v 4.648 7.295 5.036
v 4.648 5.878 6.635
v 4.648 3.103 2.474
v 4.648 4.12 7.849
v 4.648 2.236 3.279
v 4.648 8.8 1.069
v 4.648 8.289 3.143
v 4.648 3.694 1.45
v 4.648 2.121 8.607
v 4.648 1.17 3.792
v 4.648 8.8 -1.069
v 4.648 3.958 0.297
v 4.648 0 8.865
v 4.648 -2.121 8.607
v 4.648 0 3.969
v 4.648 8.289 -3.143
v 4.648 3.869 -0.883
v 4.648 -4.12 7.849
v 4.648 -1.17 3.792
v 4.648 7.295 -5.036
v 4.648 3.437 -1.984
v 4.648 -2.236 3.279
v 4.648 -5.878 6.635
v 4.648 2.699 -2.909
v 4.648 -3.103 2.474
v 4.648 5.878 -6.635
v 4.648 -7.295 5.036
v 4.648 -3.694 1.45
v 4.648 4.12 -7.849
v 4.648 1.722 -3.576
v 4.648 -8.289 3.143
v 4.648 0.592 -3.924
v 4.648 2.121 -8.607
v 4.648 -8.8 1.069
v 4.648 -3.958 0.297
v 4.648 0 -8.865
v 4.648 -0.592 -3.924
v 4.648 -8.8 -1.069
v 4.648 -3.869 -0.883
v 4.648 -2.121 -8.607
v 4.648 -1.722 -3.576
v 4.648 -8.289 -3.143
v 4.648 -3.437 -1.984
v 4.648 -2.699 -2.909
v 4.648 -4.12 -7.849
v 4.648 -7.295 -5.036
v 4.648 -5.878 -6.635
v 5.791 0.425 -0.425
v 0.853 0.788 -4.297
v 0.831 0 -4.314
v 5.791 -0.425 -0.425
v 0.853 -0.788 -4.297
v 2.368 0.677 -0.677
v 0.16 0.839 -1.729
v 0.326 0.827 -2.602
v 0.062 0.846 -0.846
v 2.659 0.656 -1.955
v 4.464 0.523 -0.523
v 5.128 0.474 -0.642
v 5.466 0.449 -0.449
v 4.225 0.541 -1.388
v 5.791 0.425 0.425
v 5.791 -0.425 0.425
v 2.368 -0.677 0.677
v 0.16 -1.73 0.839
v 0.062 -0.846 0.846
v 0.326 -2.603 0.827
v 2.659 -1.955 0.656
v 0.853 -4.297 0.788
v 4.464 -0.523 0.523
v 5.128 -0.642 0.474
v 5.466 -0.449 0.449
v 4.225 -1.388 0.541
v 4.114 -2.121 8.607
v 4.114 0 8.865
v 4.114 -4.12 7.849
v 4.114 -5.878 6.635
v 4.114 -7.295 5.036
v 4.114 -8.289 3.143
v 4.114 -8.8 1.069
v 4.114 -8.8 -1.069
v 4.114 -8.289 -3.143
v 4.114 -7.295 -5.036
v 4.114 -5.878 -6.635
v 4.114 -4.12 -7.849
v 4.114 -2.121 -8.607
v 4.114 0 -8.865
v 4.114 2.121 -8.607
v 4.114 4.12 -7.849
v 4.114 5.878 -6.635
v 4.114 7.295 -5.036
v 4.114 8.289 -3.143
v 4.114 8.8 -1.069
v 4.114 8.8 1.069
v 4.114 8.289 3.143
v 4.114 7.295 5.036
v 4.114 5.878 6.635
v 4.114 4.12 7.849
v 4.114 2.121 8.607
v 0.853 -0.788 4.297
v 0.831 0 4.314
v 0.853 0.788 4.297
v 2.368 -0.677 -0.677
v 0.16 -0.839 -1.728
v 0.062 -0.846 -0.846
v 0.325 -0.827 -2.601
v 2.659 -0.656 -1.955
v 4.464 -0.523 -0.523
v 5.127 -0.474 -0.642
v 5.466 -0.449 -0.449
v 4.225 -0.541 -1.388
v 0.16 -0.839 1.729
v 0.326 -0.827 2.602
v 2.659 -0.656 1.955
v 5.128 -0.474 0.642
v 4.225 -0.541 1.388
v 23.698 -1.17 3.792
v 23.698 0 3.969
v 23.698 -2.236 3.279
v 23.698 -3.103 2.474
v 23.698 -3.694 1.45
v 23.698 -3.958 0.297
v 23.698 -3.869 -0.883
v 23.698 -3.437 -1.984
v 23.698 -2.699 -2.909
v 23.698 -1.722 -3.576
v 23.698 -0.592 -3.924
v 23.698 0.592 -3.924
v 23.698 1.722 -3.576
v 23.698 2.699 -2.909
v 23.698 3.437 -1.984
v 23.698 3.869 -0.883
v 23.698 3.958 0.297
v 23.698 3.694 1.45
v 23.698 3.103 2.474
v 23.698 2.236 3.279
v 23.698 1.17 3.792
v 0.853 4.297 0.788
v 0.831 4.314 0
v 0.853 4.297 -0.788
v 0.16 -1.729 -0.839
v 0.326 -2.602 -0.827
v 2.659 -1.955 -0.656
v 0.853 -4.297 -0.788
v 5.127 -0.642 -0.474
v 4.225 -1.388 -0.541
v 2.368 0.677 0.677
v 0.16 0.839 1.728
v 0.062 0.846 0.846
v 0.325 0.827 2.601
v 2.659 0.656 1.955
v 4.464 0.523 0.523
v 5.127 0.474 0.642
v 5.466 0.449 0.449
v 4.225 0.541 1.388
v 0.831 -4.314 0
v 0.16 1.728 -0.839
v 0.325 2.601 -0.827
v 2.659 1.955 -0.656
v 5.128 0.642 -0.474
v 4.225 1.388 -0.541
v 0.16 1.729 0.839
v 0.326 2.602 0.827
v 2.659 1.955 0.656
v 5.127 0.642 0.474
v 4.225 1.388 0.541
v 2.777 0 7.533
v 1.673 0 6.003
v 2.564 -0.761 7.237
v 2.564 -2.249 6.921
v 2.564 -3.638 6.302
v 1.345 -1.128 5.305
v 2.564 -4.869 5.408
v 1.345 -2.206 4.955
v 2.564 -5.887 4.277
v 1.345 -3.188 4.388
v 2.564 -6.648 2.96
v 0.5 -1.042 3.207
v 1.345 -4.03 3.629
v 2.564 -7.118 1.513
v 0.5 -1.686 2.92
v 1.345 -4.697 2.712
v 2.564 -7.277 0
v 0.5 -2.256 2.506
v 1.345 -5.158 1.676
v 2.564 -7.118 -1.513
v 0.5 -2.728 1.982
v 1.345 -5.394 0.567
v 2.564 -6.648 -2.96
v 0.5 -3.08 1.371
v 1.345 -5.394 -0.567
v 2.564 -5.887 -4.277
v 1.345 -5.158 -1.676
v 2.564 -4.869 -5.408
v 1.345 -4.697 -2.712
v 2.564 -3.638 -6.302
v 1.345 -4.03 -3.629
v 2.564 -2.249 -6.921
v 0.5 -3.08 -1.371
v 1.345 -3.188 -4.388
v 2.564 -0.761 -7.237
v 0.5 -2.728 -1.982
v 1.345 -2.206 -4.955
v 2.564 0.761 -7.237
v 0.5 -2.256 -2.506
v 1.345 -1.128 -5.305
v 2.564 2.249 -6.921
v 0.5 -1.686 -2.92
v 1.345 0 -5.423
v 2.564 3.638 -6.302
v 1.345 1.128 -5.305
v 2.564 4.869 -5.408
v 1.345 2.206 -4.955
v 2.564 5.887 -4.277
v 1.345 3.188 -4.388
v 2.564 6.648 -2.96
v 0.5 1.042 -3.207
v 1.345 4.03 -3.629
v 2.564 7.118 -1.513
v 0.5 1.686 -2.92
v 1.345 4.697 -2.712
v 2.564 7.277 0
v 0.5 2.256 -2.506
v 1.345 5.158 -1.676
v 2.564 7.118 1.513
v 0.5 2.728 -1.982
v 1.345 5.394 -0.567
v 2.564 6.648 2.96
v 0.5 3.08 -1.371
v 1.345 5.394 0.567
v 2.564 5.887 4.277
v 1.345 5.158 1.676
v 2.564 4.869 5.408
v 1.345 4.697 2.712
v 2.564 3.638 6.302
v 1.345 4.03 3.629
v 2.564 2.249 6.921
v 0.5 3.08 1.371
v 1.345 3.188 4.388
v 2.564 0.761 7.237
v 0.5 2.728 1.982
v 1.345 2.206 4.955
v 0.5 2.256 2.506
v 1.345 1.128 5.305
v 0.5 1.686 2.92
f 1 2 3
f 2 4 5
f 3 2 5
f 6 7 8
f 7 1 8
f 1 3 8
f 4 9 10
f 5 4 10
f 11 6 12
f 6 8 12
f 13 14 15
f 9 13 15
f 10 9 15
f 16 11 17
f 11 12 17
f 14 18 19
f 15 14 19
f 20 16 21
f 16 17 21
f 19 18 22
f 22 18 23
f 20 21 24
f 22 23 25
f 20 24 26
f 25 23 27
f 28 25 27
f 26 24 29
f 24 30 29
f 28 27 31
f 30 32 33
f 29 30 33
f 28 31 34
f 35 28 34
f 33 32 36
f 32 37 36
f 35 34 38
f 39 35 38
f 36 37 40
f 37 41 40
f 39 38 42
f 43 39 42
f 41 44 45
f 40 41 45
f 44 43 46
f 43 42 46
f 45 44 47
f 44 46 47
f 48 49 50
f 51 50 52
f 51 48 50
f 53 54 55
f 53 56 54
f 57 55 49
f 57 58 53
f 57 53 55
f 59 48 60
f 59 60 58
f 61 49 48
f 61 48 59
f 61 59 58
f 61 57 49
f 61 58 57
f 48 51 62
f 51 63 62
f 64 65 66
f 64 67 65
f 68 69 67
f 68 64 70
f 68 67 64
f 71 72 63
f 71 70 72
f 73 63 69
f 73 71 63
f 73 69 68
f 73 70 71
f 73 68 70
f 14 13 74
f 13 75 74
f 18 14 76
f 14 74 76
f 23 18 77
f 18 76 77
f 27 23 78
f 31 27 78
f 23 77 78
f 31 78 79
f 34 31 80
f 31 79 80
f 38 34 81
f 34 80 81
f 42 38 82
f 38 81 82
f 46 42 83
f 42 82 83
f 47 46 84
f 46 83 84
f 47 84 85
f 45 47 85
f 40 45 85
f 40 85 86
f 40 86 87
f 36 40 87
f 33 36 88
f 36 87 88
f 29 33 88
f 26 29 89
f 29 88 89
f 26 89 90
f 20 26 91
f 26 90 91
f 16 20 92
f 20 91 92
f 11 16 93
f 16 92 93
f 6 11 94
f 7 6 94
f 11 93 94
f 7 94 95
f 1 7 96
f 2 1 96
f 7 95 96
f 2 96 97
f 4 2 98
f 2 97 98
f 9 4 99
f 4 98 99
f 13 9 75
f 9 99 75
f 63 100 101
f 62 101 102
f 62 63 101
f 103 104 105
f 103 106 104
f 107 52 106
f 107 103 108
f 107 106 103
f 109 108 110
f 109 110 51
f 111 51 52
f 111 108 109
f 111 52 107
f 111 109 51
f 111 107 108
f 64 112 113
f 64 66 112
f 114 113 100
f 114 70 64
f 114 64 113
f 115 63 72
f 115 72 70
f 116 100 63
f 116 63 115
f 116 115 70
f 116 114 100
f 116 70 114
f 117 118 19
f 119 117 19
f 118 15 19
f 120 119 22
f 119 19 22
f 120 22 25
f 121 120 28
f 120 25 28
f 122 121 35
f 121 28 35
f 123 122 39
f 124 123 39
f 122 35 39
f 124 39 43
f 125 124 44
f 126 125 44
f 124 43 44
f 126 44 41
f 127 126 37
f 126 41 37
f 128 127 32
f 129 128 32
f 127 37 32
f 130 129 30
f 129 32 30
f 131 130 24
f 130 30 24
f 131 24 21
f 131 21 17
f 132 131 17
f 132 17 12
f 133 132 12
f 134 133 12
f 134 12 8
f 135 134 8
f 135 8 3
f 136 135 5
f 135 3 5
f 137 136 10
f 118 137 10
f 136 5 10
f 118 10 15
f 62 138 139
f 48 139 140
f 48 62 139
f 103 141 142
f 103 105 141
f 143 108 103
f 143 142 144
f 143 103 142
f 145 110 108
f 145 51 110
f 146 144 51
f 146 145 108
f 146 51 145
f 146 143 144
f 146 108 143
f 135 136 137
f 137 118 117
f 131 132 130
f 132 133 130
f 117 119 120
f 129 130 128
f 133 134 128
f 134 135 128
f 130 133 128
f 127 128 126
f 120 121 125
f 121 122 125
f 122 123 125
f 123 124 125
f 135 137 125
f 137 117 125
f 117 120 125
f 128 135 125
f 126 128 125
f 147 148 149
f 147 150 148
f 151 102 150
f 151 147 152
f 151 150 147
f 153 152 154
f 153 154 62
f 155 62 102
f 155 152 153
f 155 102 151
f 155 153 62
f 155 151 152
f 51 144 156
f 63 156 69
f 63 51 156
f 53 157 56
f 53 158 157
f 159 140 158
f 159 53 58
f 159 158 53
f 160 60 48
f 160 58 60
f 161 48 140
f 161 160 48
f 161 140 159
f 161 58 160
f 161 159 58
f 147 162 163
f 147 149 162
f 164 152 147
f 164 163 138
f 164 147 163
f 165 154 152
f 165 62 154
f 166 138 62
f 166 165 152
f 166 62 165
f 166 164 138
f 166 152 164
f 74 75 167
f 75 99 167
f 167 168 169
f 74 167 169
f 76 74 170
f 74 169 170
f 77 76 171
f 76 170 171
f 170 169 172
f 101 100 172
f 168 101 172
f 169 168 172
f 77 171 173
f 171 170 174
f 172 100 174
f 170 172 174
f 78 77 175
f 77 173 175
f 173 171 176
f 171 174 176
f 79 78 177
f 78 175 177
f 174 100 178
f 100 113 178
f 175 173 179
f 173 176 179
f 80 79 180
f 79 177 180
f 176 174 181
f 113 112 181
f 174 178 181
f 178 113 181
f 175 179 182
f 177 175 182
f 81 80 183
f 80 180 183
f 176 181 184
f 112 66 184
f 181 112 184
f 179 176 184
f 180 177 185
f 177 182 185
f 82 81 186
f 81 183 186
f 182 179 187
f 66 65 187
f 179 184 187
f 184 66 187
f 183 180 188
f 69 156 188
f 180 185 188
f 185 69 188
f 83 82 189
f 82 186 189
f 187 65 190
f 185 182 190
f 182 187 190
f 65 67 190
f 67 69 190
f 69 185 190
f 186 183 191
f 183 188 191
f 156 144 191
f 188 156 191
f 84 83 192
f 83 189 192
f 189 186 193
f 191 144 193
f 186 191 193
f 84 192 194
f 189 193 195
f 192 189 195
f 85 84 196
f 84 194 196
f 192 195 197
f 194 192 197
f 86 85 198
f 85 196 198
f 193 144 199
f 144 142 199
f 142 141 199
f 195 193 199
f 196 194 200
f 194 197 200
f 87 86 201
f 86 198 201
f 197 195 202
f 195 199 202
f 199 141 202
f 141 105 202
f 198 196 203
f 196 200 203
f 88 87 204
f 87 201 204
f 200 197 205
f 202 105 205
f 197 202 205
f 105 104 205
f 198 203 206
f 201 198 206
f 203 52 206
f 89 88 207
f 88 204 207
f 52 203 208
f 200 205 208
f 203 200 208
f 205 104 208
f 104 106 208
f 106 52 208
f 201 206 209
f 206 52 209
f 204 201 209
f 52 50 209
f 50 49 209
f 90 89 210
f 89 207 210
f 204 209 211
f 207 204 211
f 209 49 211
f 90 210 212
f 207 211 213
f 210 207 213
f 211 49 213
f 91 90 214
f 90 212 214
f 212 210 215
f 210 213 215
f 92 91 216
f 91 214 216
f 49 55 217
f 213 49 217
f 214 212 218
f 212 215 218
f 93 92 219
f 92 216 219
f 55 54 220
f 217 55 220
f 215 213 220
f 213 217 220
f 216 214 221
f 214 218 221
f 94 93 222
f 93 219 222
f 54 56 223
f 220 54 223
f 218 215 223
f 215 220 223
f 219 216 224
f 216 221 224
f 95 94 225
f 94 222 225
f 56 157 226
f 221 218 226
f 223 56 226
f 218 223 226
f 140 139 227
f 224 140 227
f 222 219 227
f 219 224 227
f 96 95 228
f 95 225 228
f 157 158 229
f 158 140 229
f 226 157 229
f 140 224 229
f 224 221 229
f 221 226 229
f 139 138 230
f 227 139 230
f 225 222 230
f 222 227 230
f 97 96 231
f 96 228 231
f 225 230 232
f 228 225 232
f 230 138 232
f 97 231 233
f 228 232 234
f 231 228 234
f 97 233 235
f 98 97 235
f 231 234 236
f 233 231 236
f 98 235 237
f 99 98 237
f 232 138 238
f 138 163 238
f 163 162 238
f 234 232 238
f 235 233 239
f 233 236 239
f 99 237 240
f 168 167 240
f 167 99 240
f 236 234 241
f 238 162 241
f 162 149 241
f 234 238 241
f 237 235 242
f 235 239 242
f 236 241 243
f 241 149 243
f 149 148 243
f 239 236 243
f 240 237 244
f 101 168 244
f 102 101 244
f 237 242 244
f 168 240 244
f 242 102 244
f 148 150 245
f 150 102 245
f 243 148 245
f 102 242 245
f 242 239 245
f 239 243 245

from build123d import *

# Parameters (mm, degrees)
CIRPATTERN1_COUNT = 2
CIRPATTERN1_ANGLE = 90


with BuildPart() as part:
    # BodySke → Base-Revolve (revolve)
    with BuildSketch(Plane.XY, mode=Mode.PRIVATE) as base_revolve_sk:
        with BuildLine():
            Line((4.6482, 3.96875), (4.6482, 8.8646))
            Line((4.6482, 8.8646), (4.113809896, 8.8646))
            ThreePointArc((4.113809896, 8.8646), (1.078560731, 4.886321853), (0, 0))
            Line((0, 0), (23.6982, 0))
            Line((23.6982, 0), (23.6982, 3.96875))
            Line((23.6982, 3.96875), (4.6482, 3.96875))
        make_face()
    revolve(base_revolve_sk.sketch.rotate(Axis((-25.4, 0, 0), (1, 0, 0)), 90), axis=Axis((-25.4, 0, 0), (1, 0, 0)))

    # Sketch3 → Cross section 0
    with BuildSketch(Plane(origin=(0, 0, 0), x_dir=(0, 0, -1), z_dir=(1, 0, 0))):
        with BuildLine():
            Line((0.8509, -4.9657), (-0.8509, -4.9657))
            Line((-0.8509, -4.9657), (-0.8509, 4.9657))
            Line((-0.8509, 4.9657), (0.8509, 4.9657))
            Line((0.8509, 4.9657), (0.8509, -4.9657))
        make_face()
    # Sketch4 → Cross section 1
    with BuildSketch(Plane(origin=(5.7912, 0, 0), x_dir=(0, 0, -1), z_dir=(1, 0, 0))):
        with BuildLine():
            Line((0.42545, -0.42545), (-0.42545, -0.42545))
            Line((-0.42545, -0.42545), (-0.42545, 0.42545))
            Line((-0.42545, 0.42545), (0.42545, 0.42545))
            Line((0.42545, 0.42545), (0.42545, -0.42545))
        make_face()
    cross = loft(mode=Mode.SUBTRACT)

    # CirPattern1: Cross ×2 about axis
    cirpattern1_axis = Axis((0, 0, 0), (1, 0, 0))
    for i in range(1, CIRPATTERN1_COUNT):
        add(cross.rotate(cirpattern1_axis, i * CIRPATTERN1_ANGLE / (CIRPATTERN1_COUNT - 1)), mode=Mode.SUBTRACT)


solid = part.part
